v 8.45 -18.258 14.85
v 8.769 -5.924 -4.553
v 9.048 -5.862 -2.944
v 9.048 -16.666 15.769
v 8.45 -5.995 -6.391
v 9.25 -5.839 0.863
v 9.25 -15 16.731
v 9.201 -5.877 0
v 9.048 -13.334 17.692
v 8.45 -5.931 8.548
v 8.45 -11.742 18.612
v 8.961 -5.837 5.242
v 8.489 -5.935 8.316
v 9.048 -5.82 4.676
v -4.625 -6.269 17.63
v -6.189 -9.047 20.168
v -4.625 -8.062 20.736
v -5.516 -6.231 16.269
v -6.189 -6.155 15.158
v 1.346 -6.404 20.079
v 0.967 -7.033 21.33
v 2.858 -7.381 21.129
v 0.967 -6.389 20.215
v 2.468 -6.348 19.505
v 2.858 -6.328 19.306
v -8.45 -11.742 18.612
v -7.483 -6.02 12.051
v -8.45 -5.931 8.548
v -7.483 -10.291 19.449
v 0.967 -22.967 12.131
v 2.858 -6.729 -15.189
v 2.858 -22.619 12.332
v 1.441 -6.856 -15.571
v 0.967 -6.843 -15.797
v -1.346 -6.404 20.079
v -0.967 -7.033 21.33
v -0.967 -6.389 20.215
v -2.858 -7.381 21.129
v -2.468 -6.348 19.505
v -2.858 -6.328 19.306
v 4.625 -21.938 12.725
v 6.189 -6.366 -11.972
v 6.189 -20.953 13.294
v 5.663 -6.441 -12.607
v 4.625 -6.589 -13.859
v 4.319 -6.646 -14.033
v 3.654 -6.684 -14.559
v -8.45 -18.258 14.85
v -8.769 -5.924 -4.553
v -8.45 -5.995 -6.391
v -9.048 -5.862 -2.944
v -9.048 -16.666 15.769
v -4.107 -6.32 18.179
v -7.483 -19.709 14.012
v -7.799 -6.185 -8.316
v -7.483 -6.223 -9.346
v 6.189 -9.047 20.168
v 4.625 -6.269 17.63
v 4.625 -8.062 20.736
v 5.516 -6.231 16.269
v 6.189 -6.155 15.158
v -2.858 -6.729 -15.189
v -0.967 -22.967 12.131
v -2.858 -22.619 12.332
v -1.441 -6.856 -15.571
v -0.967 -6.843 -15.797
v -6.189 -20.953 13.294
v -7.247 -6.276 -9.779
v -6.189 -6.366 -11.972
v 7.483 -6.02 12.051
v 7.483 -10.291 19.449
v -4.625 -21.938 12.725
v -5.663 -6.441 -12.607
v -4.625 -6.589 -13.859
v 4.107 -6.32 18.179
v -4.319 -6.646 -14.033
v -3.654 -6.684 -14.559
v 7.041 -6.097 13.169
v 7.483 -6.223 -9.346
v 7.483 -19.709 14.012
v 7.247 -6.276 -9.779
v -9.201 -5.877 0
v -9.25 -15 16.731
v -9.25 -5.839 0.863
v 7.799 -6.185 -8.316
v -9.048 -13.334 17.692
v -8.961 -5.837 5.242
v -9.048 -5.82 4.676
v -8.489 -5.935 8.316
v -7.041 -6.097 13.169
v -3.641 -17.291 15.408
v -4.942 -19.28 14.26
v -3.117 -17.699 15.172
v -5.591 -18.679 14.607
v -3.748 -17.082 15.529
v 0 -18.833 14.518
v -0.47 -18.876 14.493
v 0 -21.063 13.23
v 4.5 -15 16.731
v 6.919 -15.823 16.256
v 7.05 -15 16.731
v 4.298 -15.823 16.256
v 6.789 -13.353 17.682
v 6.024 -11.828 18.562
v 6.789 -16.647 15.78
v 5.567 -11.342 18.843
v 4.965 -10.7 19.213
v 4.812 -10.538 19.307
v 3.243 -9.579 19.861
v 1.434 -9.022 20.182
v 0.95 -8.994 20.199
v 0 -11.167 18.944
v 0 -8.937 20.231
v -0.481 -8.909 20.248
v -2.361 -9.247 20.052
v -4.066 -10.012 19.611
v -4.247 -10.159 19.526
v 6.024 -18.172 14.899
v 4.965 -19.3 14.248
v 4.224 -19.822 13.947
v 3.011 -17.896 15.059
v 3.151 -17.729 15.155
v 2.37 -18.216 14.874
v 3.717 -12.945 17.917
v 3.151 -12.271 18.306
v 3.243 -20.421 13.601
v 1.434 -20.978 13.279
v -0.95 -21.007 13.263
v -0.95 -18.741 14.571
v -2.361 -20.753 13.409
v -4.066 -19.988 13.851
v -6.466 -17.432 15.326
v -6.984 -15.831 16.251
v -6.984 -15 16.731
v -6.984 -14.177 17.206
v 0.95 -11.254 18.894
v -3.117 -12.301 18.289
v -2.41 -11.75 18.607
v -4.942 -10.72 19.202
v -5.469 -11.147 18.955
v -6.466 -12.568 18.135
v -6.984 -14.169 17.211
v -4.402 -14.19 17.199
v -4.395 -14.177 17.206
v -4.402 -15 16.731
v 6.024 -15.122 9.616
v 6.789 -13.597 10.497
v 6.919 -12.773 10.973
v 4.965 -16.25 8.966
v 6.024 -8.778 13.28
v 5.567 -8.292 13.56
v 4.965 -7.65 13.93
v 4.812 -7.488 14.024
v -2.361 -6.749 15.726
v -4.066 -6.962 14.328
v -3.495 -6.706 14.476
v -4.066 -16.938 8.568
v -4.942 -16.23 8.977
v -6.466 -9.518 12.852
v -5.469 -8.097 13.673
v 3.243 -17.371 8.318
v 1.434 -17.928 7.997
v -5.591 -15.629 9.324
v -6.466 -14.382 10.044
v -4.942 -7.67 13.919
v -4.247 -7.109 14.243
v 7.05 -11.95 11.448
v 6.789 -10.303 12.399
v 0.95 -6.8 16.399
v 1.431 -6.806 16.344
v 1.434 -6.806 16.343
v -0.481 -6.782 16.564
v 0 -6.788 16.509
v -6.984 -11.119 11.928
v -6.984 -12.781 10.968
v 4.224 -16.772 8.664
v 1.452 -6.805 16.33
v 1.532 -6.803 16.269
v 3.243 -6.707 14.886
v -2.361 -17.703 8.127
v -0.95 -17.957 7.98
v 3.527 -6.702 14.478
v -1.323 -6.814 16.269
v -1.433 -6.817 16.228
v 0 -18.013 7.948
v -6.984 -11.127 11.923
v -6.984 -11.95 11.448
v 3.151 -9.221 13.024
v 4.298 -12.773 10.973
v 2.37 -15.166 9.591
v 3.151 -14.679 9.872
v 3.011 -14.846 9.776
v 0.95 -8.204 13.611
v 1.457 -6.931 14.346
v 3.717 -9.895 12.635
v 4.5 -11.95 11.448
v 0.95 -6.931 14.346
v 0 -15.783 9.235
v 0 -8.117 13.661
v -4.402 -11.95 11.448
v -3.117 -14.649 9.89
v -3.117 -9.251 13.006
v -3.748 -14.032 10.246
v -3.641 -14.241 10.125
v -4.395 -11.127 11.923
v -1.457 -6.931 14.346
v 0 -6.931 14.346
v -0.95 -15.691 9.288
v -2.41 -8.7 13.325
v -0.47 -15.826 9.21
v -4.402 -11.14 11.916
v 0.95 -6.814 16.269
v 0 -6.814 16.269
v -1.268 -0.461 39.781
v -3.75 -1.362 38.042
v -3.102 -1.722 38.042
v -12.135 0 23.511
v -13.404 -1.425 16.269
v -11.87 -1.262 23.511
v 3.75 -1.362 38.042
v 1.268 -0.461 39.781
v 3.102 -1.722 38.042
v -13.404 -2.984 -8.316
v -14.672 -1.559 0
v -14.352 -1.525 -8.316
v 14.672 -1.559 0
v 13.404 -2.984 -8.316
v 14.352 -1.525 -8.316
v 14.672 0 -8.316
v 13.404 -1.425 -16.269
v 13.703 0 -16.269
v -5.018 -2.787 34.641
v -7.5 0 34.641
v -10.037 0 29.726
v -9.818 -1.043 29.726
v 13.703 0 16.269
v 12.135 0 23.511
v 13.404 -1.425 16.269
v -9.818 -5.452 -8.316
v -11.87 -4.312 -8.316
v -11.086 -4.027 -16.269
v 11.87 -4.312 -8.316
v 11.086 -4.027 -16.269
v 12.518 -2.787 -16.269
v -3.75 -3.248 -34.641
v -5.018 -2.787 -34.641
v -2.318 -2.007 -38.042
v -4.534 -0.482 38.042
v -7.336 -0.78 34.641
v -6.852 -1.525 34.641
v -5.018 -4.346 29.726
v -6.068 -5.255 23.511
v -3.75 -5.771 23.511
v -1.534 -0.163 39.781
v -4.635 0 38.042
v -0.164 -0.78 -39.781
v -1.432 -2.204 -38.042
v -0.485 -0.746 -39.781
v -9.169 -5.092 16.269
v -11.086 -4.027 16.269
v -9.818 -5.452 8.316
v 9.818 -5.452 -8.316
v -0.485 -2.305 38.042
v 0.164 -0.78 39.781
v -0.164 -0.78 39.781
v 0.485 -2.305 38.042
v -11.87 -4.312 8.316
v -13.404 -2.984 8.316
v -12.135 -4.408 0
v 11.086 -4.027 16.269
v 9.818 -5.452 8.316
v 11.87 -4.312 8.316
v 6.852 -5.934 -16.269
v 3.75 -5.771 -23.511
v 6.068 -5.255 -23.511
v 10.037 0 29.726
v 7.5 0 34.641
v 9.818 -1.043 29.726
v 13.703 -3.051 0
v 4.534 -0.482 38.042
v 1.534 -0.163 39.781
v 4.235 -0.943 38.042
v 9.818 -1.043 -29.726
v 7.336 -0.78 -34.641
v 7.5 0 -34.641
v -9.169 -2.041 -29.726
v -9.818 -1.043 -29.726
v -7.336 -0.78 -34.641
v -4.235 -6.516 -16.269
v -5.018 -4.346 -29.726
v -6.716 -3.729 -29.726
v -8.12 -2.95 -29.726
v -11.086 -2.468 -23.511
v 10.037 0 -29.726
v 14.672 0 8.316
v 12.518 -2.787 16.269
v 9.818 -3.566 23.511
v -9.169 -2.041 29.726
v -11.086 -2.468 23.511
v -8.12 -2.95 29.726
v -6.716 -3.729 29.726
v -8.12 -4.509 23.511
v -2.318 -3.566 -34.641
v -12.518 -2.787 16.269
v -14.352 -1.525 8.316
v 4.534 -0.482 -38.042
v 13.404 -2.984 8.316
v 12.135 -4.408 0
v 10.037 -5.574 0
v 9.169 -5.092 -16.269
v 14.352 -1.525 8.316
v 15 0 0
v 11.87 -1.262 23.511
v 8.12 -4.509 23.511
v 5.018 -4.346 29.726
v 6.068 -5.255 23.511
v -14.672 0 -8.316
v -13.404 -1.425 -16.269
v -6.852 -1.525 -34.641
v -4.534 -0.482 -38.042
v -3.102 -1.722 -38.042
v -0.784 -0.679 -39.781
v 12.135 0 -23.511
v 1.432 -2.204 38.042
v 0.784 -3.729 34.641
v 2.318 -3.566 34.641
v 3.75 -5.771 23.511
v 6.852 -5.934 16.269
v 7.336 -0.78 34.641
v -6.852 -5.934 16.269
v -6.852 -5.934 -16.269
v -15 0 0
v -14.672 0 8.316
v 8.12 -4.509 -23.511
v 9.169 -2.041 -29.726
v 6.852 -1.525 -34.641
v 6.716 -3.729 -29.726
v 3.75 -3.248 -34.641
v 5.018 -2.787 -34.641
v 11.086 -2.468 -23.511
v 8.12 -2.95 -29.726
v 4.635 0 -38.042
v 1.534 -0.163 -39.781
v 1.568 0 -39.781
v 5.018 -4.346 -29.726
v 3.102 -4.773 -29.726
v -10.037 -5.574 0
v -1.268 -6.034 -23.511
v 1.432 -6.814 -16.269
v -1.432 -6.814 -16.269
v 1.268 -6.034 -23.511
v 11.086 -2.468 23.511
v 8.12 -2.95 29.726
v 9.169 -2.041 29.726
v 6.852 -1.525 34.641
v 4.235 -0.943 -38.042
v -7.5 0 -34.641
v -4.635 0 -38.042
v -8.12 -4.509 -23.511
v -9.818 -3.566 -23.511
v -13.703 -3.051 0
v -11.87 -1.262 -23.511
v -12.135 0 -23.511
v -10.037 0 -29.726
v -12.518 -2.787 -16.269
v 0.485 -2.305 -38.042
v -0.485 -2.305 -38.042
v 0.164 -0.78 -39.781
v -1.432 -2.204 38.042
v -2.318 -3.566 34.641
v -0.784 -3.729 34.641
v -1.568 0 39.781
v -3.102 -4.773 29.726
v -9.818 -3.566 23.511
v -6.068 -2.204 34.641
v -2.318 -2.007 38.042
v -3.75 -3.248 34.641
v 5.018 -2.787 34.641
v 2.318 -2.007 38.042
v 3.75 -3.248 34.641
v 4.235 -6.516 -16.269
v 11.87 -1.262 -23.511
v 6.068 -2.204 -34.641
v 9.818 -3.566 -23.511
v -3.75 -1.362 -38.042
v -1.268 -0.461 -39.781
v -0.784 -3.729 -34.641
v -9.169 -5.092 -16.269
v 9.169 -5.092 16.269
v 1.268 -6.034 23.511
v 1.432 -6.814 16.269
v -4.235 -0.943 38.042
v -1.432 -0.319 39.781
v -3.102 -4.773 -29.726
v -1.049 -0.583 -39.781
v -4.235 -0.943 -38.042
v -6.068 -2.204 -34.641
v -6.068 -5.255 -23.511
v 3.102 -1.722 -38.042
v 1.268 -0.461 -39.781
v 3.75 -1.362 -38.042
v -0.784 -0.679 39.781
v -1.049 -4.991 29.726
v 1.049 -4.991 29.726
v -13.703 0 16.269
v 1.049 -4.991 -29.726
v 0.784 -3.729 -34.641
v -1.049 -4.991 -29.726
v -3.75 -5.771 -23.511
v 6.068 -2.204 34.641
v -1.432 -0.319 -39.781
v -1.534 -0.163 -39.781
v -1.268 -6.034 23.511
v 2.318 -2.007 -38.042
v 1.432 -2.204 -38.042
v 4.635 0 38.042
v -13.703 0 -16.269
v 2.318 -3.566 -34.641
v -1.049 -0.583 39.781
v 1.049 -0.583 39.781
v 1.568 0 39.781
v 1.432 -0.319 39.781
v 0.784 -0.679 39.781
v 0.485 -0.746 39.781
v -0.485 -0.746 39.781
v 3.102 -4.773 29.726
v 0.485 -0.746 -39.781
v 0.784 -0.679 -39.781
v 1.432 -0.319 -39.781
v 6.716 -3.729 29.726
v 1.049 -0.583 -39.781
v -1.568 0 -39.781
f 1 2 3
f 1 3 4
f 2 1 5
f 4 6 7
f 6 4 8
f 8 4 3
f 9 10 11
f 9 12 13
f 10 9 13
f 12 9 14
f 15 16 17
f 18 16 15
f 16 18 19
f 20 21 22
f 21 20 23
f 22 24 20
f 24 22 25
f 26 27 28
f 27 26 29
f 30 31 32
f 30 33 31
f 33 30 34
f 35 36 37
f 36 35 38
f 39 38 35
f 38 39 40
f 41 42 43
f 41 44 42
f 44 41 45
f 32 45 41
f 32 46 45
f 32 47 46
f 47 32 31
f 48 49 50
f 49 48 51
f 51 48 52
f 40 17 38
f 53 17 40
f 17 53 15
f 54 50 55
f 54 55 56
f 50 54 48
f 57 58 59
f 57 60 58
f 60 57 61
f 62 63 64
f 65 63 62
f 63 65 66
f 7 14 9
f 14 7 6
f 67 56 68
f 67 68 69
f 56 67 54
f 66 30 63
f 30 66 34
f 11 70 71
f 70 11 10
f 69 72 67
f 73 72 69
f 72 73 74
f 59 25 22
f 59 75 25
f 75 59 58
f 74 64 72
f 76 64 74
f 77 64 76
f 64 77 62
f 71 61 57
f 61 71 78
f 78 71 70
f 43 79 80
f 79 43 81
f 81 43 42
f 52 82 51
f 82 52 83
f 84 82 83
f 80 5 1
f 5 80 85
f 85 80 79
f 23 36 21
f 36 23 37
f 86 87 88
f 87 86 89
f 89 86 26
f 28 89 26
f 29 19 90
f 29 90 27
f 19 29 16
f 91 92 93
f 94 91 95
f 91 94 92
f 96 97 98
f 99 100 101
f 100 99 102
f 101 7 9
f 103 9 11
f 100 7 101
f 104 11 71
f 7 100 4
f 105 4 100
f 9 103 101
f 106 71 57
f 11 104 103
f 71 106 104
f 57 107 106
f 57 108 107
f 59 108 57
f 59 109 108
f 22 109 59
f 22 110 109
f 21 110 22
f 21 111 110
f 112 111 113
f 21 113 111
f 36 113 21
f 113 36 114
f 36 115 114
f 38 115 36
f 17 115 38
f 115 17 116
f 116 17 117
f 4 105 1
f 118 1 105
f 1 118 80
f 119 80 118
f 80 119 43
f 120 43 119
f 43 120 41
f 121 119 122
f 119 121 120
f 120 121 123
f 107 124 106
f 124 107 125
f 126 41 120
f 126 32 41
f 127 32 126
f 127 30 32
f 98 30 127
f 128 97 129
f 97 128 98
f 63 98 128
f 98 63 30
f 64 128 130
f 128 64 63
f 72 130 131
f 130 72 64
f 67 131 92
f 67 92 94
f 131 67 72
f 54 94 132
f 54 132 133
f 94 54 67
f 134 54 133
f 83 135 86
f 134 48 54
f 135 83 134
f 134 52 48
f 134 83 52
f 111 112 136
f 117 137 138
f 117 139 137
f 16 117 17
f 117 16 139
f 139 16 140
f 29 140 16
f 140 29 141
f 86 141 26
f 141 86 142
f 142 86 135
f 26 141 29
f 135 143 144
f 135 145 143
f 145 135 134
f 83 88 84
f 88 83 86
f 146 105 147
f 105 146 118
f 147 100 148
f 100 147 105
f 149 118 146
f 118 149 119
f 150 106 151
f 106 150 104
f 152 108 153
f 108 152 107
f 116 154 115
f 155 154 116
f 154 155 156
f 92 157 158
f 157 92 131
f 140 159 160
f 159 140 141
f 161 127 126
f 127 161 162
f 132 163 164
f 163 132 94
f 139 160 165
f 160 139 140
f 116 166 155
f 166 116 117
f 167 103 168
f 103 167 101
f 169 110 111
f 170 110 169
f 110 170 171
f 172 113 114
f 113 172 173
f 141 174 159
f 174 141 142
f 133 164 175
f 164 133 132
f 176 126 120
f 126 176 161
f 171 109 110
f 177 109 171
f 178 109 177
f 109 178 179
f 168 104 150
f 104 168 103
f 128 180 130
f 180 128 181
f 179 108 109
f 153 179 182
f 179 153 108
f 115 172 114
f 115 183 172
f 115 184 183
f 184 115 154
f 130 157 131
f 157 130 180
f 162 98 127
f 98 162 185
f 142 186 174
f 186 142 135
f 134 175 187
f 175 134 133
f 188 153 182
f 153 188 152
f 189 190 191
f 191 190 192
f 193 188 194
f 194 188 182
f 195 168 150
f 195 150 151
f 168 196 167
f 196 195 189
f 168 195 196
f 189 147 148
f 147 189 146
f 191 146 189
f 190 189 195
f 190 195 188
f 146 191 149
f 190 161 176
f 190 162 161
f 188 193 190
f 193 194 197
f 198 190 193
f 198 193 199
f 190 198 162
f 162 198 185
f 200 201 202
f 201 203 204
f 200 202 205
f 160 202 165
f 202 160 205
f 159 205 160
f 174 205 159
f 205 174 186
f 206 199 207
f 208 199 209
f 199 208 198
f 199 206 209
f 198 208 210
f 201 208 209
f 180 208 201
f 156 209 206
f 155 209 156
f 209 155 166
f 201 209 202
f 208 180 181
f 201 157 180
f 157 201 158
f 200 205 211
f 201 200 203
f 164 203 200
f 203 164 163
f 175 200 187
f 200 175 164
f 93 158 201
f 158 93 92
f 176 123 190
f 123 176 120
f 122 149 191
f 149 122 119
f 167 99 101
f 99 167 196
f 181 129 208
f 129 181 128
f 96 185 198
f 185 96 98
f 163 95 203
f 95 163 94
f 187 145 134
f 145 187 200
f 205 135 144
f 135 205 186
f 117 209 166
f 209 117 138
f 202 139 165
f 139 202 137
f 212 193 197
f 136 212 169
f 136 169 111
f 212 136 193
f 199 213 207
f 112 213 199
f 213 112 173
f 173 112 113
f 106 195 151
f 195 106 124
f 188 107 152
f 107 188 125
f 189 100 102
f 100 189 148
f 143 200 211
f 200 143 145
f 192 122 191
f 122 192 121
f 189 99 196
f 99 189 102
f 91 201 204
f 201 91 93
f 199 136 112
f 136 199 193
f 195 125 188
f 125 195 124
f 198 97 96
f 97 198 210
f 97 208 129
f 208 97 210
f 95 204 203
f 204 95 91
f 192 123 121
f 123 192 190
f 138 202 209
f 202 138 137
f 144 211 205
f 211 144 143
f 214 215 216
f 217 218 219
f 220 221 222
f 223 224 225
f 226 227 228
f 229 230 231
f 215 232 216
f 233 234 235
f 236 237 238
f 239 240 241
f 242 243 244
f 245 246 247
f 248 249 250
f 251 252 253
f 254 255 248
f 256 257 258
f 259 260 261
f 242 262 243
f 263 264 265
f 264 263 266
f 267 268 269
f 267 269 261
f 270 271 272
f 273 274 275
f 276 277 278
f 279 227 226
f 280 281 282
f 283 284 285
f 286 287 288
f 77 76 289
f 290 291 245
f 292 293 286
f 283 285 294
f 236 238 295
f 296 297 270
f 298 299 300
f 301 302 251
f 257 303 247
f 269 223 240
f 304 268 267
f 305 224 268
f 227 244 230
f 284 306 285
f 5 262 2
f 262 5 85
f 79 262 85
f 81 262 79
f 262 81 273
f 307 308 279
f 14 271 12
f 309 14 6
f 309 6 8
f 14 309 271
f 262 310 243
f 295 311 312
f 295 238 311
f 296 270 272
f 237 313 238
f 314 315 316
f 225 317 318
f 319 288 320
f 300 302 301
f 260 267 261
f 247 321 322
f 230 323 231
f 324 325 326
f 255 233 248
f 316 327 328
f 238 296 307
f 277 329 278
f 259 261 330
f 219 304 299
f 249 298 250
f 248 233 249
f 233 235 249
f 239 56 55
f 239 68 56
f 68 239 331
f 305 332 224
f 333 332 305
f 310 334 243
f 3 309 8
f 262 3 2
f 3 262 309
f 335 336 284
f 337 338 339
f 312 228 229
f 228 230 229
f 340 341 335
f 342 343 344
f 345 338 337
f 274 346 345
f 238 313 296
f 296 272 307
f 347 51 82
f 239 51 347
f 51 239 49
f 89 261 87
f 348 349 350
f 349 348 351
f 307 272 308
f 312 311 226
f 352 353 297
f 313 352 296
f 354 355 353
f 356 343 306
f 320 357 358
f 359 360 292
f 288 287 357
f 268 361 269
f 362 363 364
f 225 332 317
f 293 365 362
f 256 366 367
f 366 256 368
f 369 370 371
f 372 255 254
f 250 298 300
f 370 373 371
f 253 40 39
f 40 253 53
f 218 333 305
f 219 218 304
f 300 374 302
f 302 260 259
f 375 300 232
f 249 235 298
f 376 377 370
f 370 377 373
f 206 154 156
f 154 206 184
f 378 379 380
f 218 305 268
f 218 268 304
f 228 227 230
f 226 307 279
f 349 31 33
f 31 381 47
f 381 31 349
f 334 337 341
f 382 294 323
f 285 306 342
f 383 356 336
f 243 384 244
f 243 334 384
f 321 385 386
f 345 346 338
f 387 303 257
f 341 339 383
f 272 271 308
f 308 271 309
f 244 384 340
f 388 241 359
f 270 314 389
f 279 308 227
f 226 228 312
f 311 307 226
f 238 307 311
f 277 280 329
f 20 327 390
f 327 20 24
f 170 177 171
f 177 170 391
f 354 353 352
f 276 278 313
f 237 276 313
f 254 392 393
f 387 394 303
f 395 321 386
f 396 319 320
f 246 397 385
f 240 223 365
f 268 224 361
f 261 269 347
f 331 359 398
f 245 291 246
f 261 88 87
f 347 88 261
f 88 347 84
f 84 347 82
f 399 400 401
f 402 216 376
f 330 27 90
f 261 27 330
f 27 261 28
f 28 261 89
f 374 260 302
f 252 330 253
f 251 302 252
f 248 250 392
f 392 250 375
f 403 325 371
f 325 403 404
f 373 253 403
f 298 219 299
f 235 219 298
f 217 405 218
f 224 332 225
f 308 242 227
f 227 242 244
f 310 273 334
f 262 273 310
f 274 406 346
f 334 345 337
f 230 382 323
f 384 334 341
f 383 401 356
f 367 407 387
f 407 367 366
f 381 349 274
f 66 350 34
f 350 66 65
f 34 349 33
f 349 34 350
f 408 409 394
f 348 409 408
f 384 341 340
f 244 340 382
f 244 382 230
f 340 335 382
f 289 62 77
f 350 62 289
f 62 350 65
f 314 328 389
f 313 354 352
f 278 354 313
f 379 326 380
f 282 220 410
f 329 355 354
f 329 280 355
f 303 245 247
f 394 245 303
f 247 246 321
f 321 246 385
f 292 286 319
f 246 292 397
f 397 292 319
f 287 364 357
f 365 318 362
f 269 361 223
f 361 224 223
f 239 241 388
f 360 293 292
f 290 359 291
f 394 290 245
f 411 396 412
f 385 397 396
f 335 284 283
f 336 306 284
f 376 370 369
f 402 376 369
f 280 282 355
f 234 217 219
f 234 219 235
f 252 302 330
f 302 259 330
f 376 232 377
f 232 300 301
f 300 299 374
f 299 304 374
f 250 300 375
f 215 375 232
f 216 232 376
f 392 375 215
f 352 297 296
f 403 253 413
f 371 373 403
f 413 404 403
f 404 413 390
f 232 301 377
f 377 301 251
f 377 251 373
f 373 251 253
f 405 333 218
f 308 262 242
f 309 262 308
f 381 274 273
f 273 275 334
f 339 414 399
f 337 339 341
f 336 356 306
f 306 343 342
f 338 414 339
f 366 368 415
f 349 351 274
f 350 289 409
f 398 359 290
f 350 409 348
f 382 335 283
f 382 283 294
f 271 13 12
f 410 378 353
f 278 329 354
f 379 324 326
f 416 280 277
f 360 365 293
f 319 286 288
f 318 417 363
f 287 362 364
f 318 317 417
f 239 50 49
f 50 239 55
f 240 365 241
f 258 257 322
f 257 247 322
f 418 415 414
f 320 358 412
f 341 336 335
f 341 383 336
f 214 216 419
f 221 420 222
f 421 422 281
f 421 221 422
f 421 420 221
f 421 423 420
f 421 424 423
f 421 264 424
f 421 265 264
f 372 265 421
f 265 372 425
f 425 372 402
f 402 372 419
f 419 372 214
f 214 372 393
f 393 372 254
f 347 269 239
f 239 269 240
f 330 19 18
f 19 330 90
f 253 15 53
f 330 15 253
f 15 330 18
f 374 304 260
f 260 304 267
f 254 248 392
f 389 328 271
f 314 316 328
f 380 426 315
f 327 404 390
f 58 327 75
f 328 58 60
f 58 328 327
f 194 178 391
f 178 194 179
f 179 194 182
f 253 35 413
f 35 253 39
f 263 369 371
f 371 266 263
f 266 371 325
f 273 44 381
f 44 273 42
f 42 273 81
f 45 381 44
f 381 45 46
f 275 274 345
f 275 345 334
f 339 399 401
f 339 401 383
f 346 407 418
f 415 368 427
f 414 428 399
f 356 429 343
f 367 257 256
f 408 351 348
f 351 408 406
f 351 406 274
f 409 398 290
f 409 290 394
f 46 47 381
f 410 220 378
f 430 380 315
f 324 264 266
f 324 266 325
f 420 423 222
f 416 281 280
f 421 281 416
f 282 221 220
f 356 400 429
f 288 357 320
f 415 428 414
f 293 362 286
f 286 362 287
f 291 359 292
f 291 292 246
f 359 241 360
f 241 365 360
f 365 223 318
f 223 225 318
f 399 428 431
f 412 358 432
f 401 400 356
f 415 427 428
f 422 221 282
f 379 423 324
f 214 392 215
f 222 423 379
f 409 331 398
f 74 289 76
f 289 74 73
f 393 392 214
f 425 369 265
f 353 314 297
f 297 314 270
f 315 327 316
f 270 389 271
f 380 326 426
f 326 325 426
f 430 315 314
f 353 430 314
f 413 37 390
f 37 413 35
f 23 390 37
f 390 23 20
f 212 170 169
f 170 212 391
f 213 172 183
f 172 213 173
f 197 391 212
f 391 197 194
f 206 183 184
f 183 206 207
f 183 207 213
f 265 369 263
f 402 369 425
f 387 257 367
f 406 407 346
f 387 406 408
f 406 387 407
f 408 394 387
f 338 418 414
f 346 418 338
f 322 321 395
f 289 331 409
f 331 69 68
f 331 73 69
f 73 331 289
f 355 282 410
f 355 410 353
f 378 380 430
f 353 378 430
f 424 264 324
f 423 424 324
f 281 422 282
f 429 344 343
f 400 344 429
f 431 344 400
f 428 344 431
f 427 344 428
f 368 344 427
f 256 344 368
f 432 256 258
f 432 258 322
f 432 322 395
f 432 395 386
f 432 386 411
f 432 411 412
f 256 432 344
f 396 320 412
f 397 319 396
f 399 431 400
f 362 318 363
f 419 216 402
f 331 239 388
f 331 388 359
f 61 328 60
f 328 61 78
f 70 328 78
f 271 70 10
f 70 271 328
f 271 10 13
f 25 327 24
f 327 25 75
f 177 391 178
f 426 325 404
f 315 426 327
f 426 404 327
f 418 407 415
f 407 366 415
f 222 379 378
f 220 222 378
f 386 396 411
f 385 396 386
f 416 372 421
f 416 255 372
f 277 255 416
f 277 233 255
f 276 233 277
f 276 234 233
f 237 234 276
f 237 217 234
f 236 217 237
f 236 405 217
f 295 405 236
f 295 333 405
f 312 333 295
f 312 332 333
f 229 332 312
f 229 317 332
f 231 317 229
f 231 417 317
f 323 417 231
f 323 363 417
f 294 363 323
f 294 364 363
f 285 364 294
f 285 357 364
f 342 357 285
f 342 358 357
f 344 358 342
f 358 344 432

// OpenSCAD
// design choices

num_markers = 2;
angle_from_wall = 30;
stick_out = 30;



d_marker = 18.5;
h_marker = 120.2;
d_cap_rest_hole = 14.1;
h_cap_rest_hole = 6.1;
flange_thickness = .95;
num_flanges = 8;
flange_from_center=4.5;

module marker(){
    difference(){
        cylinder(d=d_marker, h=h_marker);
        cylinder(d=d_cap_rest_hole, h=h_cap_rest_hole);
    }
    difference(){
        for(i = [1:num_flanges]){
            rotate([0,0,i*360/num_flanges])
            cube([d_cap_rest_hole/2, flange_thickness, h_cap_rest_hole]);
        }
        cylinder(r=flange_from_center, h=h_cap_rest_hole);
    }
}
difference(){
    union(){
        translate([0,0,-d_marker/2])
            rotate([180+angle_from_wall,0,0])
                translate([0,0,-stick_out])
                    marker();
        scale([.3,.15,.8]){
            sphere(d=100);
        }
    }
    translate([-500,0,-500]) cube([1000,1000,1000]);
}
